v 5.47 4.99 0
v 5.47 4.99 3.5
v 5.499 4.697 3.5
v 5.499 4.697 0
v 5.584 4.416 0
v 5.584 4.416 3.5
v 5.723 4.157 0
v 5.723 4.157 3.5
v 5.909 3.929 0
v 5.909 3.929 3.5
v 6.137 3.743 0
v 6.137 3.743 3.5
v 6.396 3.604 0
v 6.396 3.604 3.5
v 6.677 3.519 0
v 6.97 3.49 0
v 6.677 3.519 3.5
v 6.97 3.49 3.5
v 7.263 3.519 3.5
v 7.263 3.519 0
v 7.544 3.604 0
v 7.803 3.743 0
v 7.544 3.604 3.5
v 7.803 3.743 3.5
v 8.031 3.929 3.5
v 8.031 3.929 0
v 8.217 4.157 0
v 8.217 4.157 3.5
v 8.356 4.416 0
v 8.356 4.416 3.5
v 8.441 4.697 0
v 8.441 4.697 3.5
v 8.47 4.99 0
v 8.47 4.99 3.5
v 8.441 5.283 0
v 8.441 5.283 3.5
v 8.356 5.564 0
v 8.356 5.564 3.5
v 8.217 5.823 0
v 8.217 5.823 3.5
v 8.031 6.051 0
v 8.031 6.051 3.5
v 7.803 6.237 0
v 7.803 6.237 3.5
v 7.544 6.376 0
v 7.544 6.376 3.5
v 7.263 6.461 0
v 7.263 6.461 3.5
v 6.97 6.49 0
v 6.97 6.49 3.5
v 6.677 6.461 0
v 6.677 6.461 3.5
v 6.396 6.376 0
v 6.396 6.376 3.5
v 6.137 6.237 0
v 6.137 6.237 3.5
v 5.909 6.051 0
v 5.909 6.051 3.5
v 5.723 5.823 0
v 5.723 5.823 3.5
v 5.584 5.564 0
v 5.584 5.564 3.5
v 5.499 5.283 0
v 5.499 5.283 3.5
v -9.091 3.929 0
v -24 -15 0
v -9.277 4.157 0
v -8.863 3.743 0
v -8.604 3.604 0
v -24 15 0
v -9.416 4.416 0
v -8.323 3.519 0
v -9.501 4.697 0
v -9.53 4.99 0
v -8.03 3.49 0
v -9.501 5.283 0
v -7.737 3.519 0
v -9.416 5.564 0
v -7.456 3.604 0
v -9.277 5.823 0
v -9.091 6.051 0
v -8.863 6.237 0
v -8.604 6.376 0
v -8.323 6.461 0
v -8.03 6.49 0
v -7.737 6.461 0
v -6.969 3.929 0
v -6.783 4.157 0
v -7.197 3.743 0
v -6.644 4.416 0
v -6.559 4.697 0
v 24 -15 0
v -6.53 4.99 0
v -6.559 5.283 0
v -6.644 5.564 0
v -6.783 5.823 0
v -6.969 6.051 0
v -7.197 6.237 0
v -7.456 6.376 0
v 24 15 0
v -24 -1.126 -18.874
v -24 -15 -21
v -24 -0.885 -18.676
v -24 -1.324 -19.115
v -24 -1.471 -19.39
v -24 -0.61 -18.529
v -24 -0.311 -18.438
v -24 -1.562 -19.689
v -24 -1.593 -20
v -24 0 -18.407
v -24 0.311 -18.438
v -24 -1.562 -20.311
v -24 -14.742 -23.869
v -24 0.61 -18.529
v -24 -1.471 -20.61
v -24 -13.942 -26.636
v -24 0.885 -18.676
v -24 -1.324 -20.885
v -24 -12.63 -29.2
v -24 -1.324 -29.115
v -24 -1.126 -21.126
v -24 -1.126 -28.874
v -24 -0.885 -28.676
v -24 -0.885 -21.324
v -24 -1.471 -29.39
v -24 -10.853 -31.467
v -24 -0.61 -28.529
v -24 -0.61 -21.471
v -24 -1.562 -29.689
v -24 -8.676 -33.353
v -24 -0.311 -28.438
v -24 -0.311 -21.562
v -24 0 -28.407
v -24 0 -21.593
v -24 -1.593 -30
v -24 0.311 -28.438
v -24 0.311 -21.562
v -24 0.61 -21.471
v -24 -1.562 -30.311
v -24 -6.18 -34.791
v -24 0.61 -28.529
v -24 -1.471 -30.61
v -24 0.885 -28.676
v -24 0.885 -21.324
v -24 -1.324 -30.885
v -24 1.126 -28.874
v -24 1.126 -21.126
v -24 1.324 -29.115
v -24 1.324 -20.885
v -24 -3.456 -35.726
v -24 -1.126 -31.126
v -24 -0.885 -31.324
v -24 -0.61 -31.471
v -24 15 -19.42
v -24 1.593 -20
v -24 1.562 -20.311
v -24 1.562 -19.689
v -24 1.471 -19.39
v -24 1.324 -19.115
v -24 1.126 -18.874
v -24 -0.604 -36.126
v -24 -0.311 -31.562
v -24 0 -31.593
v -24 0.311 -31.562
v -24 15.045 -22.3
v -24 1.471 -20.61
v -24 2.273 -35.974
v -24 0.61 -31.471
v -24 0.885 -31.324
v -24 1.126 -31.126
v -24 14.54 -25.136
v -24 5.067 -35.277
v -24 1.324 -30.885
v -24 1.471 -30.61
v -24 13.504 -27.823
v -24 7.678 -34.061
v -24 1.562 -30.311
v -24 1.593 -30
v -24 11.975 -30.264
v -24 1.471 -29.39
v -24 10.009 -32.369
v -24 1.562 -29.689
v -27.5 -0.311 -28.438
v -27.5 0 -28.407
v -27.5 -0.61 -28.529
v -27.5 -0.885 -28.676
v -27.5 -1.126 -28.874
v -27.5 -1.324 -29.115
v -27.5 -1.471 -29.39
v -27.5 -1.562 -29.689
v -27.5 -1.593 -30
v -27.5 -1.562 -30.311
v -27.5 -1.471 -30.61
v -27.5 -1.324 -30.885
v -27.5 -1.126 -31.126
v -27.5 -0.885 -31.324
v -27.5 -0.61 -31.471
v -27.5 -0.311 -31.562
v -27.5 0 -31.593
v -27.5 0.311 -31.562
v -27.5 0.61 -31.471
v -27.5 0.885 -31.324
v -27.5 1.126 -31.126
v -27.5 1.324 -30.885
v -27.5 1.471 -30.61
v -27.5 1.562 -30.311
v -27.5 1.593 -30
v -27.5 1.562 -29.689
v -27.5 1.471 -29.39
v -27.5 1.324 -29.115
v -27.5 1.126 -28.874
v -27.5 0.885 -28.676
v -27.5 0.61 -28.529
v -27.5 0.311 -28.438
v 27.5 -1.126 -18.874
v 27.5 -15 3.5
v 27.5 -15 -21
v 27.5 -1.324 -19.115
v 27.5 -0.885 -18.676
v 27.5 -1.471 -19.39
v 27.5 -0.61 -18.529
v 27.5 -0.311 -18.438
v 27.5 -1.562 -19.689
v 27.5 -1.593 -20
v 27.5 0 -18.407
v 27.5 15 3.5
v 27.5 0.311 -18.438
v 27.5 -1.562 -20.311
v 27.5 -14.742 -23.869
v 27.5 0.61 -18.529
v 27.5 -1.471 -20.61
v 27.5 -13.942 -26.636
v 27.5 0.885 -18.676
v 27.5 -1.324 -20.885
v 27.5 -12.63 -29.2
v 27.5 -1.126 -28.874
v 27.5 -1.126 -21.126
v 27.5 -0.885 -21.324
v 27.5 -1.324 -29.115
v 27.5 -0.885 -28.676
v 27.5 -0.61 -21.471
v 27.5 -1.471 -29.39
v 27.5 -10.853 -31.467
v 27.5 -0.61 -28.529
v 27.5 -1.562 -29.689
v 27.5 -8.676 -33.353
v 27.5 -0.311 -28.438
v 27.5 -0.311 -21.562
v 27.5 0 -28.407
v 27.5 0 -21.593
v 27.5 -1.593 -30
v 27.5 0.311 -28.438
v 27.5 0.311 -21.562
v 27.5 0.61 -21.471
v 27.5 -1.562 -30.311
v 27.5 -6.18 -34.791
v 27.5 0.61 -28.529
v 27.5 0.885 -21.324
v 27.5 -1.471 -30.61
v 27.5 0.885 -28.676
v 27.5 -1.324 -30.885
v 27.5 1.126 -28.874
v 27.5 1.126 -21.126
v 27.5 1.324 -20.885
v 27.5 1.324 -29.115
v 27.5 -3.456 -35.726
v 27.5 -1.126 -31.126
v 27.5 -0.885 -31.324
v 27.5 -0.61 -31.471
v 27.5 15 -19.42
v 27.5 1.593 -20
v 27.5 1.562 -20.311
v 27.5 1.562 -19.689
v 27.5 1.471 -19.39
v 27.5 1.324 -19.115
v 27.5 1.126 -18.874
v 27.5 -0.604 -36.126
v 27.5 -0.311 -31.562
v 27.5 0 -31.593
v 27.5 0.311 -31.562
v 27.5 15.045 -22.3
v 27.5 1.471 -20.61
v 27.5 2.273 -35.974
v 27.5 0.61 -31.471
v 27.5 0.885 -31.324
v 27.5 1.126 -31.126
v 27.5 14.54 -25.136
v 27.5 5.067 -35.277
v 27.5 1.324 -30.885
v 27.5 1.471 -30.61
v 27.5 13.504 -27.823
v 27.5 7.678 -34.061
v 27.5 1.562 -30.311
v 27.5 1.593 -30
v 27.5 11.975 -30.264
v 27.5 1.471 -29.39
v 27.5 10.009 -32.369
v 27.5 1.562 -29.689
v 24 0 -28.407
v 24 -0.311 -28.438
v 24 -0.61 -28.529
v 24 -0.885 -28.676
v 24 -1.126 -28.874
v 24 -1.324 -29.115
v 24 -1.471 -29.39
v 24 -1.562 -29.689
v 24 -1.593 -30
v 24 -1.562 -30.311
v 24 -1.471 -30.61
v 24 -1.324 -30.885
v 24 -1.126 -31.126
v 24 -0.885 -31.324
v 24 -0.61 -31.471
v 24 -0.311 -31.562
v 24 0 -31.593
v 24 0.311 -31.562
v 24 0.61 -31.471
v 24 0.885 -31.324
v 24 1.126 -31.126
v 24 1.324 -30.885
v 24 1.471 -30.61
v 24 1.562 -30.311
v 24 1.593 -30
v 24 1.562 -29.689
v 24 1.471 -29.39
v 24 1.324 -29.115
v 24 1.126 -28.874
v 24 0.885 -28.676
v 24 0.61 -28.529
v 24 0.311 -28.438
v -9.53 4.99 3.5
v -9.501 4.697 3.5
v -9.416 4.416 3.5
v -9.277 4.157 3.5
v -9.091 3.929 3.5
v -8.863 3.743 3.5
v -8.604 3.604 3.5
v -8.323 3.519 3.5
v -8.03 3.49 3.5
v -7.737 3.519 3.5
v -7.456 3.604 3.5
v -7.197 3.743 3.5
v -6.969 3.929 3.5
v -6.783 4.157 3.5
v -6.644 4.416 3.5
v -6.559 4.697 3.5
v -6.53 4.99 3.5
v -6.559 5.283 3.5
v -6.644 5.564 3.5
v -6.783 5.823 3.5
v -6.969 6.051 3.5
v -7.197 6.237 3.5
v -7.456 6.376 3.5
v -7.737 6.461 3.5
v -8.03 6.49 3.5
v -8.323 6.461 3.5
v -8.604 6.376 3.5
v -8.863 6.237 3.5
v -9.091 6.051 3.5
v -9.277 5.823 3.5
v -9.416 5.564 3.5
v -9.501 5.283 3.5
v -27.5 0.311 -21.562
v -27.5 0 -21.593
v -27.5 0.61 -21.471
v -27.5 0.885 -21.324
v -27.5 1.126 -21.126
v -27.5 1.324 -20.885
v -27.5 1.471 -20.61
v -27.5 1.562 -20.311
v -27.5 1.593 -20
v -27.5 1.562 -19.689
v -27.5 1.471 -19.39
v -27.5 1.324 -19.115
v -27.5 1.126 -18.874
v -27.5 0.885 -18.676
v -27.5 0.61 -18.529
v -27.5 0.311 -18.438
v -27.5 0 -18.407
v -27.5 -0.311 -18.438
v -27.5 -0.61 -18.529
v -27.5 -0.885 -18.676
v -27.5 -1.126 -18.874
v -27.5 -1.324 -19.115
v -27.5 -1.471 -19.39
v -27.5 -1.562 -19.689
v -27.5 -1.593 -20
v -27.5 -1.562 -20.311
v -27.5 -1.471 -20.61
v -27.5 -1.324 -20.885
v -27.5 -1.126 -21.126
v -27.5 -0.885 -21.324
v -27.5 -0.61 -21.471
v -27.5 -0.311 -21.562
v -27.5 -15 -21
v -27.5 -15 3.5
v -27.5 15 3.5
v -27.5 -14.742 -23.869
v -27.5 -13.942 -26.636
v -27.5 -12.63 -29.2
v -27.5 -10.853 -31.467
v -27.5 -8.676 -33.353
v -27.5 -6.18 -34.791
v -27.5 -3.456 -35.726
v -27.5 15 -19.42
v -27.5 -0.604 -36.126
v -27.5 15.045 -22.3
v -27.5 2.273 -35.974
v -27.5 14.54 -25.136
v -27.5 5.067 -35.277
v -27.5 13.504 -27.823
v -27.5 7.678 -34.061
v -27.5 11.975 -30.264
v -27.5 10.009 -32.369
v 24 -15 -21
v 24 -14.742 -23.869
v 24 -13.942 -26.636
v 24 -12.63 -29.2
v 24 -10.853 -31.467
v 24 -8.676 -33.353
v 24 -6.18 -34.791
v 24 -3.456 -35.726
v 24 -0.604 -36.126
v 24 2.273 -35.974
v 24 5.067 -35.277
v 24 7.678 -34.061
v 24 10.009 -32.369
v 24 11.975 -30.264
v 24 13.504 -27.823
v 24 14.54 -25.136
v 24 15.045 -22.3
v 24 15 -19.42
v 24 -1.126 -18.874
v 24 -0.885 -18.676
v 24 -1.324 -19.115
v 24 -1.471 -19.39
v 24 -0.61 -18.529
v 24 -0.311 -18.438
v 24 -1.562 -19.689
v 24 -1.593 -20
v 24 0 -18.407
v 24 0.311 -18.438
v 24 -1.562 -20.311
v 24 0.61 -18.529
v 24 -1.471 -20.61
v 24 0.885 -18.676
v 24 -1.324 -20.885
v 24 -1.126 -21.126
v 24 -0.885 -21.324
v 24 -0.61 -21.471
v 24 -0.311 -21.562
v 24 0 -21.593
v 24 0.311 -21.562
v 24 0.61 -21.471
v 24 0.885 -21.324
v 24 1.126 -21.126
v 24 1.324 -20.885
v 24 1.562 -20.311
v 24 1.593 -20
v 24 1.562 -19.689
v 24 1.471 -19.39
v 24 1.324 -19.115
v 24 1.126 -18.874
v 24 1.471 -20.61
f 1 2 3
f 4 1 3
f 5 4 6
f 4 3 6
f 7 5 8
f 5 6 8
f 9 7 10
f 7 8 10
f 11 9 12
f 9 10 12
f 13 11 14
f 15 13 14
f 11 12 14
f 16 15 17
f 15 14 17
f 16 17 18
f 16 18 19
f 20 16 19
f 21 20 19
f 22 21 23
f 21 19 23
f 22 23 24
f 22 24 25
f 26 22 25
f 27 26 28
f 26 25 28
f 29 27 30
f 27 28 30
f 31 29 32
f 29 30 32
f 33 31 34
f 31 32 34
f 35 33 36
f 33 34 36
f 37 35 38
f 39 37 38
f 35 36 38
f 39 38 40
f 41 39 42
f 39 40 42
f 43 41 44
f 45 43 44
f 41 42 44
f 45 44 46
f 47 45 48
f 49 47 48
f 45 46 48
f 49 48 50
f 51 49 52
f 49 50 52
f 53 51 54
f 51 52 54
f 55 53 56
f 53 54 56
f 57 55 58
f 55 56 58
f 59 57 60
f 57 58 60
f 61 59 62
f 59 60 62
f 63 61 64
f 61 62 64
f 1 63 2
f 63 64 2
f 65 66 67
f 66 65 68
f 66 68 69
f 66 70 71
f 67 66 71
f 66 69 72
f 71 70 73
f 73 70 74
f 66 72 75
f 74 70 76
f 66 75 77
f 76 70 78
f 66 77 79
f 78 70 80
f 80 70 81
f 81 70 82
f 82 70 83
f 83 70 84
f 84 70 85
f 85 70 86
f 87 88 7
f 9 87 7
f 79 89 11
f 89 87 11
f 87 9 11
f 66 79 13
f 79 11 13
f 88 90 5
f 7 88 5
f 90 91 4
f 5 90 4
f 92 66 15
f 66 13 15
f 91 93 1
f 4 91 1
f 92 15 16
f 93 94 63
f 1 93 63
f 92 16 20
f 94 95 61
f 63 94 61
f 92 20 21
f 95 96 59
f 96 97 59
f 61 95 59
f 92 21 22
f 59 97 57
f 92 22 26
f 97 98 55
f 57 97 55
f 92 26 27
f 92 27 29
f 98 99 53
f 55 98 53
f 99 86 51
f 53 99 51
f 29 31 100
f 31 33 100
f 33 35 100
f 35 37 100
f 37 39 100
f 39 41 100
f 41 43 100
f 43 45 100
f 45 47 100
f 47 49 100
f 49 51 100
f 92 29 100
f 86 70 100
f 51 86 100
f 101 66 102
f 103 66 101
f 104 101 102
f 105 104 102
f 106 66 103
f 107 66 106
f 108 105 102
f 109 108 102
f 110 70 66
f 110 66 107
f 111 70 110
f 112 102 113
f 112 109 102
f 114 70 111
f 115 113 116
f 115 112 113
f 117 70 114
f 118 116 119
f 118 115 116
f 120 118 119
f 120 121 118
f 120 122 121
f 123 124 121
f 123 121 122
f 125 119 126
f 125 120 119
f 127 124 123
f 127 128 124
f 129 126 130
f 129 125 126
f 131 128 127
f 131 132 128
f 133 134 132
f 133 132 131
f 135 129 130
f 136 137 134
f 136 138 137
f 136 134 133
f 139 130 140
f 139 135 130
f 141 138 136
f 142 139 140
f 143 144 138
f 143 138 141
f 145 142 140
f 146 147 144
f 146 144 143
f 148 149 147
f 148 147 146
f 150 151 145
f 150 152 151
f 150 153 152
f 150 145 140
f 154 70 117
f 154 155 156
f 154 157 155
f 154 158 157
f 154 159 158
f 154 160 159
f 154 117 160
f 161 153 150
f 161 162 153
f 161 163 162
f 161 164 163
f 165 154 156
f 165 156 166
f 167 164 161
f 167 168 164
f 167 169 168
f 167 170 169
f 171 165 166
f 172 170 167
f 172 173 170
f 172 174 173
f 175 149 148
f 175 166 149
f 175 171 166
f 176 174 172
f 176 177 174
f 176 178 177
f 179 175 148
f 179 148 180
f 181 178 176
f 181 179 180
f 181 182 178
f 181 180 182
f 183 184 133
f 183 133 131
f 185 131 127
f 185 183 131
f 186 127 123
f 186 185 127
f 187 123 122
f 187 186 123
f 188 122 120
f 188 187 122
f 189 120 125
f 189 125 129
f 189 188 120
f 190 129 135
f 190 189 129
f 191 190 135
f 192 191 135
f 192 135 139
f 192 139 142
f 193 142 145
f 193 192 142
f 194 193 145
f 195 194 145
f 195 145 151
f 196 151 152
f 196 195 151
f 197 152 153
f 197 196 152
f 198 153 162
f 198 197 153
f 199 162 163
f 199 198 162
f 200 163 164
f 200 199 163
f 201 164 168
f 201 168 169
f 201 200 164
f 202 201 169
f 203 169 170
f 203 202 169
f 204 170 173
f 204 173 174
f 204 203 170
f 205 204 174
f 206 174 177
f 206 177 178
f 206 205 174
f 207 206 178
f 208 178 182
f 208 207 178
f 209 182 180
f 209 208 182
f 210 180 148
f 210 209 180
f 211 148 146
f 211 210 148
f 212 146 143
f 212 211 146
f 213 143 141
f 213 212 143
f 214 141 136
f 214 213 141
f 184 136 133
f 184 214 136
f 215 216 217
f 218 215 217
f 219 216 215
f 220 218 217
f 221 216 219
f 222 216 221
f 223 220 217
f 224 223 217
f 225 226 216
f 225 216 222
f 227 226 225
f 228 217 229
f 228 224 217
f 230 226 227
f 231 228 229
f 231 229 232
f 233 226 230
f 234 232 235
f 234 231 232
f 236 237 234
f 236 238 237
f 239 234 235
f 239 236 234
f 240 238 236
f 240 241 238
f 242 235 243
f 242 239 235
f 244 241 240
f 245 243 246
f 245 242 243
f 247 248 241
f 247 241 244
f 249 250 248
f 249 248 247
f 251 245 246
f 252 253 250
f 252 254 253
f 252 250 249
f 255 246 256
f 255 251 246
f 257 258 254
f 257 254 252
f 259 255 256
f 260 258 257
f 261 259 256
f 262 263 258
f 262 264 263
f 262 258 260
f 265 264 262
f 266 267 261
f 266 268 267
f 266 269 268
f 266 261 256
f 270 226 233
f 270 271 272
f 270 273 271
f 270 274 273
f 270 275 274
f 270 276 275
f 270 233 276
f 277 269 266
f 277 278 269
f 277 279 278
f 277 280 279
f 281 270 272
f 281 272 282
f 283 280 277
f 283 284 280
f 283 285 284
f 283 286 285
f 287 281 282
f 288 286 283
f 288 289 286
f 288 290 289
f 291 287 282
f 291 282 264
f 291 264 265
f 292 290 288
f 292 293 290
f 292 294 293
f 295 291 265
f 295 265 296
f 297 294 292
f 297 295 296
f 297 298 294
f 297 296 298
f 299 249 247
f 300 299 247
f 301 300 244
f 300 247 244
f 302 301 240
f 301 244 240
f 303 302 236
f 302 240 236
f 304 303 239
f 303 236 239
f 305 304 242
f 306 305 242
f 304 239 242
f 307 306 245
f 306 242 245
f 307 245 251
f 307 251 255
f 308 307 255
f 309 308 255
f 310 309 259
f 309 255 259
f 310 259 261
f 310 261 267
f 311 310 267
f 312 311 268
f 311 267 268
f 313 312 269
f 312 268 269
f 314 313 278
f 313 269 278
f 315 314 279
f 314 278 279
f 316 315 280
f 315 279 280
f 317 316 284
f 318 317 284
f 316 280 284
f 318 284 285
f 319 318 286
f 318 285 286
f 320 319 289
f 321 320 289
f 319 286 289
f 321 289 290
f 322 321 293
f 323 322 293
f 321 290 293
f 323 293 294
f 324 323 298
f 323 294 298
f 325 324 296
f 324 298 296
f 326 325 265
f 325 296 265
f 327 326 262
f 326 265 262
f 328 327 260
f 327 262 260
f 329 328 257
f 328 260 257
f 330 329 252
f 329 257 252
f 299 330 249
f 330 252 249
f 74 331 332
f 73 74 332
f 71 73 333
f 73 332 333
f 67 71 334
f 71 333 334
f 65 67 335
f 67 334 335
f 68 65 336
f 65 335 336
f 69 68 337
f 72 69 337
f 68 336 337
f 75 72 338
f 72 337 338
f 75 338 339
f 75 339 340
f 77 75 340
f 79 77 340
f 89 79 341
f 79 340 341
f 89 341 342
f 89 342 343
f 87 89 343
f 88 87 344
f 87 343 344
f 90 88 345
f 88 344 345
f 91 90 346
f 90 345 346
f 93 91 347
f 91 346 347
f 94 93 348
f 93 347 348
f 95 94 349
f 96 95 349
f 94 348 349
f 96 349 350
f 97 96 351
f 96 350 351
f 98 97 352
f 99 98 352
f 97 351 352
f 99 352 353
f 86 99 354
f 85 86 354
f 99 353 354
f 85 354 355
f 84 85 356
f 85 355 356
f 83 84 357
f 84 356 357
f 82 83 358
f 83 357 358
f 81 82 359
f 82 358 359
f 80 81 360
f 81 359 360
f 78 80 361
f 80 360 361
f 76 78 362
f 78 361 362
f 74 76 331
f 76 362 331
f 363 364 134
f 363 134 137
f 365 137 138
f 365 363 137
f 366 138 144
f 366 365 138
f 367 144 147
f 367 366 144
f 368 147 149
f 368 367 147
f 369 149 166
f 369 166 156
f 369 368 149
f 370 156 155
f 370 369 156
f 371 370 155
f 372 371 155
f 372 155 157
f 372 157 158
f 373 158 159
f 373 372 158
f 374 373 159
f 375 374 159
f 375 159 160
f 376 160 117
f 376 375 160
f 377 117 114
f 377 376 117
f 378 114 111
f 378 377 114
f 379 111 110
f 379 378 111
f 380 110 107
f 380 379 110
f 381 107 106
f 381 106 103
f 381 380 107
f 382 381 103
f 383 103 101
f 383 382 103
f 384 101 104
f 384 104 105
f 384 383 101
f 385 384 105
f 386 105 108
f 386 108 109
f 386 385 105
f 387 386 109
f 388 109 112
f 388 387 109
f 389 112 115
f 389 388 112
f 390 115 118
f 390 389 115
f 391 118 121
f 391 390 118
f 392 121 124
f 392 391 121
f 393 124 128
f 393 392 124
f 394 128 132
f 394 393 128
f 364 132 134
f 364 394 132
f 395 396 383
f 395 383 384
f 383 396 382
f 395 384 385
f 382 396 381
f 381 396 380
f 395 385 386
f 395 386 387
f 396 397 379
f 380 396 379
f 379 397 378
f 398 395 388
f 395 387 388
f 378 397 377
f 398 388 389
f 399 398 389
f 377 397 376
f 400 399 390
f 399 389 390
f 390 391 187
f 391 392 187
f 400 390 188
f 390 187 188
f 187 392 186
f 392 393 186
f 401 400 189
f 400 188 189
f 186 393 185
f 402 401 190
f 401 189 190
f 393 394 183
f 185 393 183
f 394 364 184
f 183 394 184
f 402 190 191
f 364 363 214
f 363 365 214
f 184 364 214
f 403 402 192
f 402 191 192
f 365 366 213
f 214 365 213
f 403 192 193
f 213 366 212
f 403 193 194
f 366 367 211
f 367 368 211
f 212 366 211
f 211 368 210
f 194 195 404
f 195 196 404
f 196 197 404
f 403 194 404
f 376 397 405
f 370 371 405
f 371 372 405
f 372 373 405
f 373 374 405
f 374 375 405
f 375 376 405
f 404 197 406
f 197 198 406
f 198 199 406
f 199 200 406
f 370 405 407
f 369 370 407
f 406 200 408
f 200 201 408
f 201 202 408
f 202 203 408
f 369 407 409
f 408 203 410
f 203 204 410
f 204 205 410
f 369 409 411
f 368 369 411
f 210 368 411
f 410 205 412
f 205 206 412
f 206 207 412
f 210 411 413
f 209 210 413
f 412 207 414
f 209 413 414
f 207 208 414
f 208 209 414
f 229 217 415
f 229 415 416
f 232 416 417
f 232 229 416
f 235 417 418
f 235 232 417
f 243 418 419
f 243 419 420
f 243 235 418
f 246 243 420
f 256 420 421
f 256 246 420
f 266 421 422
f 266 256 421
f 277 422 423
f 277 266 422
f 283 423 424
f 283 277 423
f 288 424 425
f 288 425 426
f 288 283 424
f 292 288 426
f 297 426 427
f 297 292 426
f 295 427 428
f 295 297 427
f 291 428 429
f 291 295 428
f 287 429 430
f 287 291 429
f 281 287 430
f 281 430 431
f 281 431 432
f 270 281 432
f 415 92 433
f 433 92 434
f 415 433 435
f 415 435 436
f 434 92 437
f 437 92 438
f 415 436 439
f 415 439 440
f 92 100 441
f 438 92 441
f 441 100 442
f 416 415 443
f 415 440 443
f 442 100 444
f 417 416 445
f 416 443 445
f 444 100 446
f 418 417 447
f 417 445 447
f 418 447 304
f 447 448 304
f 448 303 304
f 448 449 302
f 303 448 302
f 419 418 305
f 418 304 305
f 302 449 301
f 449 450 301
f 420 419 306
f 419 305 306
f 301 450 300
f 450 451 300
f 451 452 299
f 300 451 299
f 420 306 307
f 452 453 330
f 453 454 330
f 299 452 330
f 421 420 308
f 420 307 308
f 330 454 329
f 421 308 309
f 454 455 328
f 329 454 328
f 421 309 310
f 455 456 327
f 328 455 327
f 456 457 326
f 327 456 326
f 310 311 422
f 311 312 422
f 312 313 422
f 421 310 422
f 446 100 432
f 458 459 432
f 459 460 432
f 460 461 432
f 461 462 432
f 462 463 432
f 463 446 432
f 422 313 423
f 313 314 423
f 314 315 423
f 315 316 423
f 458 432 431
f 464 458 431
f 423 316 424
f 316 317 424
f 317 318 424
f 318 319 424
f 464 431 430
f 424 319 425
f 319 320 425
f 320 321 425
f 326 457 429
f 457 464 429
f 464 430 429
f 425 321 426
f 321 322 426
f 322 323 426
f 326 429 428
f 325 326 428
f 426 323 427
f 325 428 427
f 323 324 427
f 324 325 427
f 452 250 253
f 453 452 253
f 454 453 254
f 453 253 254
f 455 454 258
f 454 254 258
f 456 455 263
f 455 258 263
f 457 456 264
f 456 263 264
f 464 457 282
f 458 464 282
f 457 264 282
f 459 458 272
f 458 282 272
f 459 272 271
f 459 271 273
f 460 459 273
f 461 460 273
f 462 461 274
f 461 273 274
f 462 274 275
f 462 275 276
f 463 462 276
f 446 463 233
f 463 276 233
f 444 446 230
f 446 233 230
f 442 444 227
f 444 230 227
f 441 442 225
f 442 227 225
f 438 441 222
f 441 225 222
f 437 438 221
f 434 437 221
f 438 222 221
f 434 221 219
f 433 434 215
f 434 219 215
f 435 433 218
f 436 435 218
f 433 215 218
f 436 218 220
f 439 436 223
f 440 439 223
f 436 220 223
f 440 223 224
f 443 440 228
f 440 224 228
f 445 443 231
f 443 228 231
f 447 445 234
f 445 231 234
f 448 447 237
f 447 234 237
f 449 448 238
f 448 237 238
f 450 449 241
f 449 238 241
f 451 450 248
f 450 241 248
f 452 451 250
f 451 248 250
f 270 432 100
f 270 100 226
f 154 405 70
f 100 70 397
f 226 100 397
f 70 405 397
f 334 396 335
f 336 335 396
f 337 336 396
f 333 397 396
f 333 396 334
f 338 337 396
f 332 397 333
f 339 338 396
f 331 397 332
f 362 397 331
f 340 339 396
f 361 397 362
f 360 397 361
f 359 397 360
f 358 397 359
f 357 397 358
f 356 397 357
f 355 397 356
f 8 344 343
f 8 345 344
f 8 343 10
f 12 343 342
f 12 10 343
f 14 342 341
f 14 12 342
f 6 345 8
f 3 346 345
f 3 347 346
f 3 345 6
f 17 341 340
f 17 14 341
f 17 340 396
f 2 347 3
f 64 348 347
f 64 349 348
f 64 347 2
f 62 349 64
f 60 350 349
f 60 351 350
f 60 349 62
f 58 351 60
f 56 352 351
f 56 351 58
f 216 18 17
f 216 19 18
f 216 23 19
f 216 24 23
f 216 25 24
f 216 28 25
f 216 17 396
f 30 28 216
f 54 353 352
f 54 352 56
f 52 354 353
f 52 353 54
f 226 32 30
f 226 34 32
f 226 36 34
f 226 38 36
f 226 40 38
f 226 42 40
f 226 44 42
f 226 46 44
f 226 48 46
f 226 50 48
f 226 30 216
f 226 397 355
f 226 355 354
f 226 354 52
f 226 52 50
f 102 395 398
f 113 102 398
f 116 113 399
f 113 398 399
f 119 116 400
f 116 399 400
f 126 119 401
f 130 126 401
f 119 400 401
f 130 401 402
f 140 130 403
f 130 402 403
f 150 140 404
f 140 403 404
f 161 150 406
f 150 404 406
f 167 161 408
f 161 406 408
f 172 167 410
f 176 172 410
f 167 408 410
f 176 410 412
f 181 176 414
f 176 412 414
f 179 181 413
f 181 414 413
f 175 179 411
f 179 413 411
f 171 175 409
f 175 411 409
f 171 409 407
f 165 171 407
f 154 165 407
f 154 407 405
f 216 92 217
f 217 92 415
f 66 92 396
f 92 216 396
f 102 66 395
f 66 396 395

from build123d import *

# Parameters (mm, degrees)
SKETCH_1_W          = 55
SKETCH_1_H          = 30
EXTRUDE_1_DEPTH     = 3.5
SKETCH_2_R          = 1.592723526
EXTRUDE_2_DEPTH     = 3.5
SKETCH_3_R          = 1.5
CUT_EXTRUDE_1_DEPTH = 3.5


with BuildPart() as part:
    # 草图1 → 凸台-拉伸1 (new body)
    with BuildSketch(Plane.XY):
        Rectangle(SKETCH_1_W, SKETCH_1_H)
    extrude(amount=EXTRUDE_1_DEPTH)

    # 草图2 → 凸台-拉伸2 (add)
    with BuildSketch(Plane(origin=(27.5, 0, 0), x_dir=(0, 0, -1), z_dir=(1, 0, 0))):
        with BuildLine():
            Line((0, 15), (0, -15))
            Line((0, -15), (21, -15))
            ThreePointArc((21, -15), (36.119015722, 0.838004237), (19.419767517, 15))
            Line((19.419767517, 15), (0, 15))
        make_face()
        with Locations((20, 0)):
            Circle(SKETCH_2_R, mode=Mode.SUBTRACT)
        with Locations(Location((30, 0, 0), (0, 0, 180))):
            Circle(SKETCH_2_R, mode=Mode.SUBTRACT)
    extrude_2 = extrude(amount=-EXTRUDE_2_DEPTH)

    # 镜向1: 凸台-拉伸2 across plane
    add(extrude_2.mirror(Plane(origin=(0, 0, 0), x_dir=(0, 0, 1), z_dir=(1, 0, 0))))

    # 草图3 → 切除-拉伸1 (cut)
    with BuildSketch(Plane.XY.offset(3.5)):
        with Locations(Location((6.970033691, 4.99, 0), (0, 0, 180))):
            Circle(SKETCH_3_R)
        with Locations(Location((-8.029966309, 4.99, 0), (0, 0, 180))):
            Circle(SKETCH_3_R)
    extrude(amount=-CUT_EXTRUDE_1_DEPTH, mode=Mode.SUBTRACT)


solid = part.part
